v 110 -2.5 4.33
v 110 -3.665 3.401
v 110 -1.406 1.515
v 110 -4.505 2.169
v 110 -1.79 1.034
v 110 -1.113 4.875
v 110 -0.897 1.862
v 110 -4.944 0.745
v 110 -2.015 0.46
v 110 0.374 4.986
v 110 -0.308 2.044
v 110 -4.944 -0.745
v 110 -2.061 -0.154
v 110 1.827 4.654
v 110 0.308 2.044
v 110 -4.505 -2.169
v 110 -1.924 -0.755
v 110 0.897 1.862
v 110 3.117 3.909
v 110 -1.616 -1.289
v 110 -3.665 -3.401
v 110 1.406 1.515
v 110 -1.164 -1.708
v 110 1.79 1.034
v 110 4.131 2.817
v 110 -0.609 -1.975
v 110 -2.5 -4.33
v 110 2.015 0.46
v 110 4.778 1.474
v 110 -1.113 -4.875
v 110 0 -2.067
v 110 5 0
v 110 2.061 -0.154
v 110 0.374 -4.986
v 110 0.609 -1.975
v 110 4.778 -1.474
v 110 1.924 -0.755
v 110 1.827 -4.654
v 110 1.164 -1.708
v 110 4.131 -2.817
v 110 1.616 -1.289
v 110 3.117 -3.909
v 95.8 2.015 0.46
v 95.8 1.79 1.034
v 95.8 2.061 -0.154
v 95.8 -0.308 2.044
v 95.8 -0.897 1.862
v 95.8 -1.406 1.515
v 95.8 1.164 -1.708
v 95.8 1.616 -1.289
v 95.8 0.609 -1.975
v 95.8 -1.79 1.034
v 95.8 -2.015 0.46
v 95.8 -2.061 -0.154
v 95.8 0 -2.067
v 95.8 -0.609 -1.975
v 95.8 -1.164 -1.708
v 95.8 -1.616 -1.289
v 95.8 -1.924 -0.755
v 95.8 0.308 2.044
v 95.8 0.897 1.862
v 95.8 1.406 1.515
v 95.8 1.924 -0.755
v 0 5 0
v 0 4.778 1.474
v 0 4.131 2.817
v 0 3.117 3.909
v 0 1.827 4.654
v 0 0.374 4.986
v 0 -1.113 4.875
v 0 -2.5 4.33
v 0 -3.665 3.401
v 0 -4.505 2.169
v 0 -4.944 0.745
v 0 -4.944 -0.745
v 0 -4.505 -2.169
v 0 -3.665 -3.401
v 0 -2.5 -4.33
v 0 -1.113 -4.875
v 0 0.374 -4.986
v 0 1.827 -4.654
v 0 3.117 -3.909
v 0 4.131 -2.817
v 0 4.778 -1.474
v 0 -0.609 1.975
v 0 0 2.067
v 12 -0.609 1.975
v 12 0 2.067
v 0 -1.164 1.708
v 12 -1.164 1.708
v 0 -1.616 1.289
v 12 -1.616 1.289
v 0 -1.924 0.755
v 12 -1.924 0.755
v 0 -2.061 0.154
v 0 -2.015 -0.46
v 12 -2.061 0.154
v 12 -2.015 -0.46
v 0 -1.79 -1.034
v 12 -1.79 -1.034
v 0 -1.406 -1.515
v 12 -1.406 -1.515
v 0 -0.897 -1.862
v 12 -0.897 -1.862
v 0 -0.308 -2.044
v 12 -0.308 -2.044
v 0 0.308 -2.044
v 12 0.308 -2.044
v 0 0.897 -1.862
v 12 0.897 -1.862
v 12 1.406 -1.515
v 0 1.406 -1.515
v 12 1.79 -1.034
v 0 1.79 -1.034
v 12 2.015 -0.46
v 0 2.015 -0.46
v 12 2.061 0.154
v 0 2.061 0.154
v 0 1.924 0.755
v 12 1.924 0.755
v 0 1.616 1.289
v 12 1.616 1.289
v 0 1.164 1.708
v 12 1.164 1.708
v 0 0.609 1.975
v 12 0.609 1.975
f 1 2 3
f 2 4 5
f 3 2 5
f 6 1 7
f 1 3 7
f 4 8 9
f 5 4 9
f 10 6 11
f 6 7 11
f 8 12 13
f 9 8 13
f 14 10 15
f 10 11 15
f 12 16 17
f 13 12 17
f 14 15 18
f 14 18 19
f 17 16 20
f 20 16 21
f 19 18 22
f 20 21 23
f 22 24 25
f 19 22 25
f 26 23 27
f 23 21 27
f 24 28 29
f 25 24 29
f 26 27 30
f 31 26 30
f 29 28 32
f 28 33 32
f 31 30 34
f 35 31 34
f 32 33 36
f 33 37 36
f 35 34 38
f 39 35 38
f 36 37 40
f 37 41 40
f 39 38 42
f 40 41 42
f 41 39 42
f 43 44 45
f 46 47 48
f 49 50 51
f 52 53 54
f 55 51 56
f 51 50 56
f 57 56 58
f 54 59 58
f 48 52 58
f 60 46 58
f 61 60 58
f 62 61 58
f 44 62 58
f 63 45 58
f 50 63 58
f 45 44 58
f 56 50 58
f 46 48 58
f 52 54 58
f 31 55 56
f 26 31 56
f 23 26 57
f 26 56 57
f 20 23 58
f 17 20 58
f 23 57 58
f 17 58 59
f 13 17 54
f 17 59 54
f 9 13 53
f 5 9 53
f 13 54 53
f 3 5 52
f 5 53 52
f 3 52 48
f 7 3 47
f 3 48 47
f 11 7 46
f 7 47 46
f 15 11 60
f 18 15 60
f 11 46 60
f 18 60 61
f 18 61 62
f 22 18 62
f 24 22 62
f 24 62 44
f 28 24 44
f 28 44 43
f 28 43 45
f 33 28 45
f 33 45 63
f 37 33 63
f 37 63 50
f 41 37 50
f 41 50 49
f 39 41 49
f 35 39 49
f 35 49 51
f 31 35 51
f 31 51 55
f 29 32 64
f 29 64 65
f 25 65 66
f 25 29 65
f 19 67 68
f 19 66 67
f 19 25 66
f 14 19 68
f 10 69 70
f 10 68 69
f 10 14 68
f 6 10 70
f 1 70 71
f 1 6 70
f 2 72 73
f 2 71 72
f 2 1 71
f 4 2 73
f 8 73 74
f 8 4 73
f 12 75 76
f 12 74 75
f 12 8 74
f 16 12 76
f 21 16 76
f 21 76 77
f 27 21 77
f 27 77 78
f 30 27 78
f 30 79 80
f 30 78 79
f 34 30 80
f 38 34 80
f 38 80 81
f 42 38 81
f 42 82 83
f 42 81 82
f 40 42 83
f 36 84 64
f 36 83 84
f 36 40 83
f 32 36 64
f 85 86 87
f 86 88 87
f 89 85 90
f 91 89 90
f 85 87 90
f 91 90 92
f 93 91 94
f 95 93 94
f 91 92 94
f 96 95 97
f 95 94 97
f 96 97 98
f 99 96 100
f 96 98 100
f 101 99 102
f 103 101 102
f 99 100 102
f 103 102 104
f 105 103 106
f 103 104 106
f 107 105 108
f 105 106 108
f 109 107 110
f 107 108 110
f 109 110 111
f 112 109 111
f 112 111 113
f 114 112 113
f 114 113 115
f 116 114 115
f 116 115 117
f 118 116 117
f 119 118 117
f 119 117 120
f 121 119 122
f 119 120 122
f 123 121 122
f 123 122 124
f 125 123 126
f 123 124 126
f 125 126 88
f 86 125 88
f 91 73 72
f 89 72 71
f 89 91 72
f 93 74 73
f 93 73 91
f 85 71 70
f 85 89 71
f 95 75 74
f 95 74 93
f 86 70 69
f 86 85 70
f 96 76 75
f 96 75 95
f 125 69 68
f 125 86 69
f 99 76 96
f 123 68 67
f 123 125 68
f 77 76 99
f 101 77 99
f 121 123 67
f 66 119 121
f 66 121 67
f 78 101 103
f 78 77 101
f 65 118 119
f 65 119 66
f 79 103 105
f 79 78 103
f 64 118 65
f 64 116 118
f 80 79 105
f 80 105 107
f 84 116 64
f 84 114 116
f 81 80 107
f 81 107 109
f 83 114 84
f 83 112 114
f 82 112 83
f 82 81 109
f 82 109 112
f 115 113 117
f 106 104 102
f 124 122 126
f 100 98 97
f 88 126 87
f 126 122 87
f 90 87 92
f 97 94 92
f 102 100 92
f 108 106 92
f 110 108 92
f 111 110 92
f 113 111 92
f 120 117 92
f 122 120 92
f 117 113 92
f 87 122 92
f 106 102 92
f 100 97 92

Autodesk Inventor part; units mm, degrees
ref_plane "YZ Plane" through (0, 0, 0) normal (1, 0, 0) x (0, 1, 0)
ref_plane "XZ Plane" through (0, 0, 0) normal (0, 1, 0) x (-1, 0, 0)
ref_plane "XY Plane" through (0, 0, 0) normal (0, 0, 1) x (1, 0, 0)
sketch "Sketch1" plane through (0, 0, 0) normal (0, 0, 1) x (1, 0, 0)
  line L0 (0, 0) -> (0, 5)
  line L1 (0, 5) -> (110, 5)
  line L2 (110, 5) -> (110, 0)
  line L3 (110, 0) -> (0, 0)
  dimension "d0" = 110
  dimension "d1" = 10
revolve "Revolution1" add sketch "Sketch1" angle 360 about axis through (110, 0, 0) along (-1, 0, 0)
sketch "Sketch2" plane through (110, 0, 0) normal (1, 0, 0) x (0, 0, -1)
  circle A0 centre (0, 0) radius 5 projected
hole "Hole1" at (110, 0, 0) direction (-1, 0, 0) diameter 4.134 depth 14.2 thread size "M5x0.8" class "6H" standard "ISO Metric profile"
sketch "Sketch3" plane through (0, 0, 0) normal (-1, 0, 0) x (0, 0, 1)
  circle A0 centre (0, 0) radius 5 projected
hole "Hole2" at (0, 0, 0) direction (1, 0, 0) diameter 4.134 depth 12 thread size "M5x0.8" class "6H" standard "ISO Metric profile"
properties part number "1 part 21"
